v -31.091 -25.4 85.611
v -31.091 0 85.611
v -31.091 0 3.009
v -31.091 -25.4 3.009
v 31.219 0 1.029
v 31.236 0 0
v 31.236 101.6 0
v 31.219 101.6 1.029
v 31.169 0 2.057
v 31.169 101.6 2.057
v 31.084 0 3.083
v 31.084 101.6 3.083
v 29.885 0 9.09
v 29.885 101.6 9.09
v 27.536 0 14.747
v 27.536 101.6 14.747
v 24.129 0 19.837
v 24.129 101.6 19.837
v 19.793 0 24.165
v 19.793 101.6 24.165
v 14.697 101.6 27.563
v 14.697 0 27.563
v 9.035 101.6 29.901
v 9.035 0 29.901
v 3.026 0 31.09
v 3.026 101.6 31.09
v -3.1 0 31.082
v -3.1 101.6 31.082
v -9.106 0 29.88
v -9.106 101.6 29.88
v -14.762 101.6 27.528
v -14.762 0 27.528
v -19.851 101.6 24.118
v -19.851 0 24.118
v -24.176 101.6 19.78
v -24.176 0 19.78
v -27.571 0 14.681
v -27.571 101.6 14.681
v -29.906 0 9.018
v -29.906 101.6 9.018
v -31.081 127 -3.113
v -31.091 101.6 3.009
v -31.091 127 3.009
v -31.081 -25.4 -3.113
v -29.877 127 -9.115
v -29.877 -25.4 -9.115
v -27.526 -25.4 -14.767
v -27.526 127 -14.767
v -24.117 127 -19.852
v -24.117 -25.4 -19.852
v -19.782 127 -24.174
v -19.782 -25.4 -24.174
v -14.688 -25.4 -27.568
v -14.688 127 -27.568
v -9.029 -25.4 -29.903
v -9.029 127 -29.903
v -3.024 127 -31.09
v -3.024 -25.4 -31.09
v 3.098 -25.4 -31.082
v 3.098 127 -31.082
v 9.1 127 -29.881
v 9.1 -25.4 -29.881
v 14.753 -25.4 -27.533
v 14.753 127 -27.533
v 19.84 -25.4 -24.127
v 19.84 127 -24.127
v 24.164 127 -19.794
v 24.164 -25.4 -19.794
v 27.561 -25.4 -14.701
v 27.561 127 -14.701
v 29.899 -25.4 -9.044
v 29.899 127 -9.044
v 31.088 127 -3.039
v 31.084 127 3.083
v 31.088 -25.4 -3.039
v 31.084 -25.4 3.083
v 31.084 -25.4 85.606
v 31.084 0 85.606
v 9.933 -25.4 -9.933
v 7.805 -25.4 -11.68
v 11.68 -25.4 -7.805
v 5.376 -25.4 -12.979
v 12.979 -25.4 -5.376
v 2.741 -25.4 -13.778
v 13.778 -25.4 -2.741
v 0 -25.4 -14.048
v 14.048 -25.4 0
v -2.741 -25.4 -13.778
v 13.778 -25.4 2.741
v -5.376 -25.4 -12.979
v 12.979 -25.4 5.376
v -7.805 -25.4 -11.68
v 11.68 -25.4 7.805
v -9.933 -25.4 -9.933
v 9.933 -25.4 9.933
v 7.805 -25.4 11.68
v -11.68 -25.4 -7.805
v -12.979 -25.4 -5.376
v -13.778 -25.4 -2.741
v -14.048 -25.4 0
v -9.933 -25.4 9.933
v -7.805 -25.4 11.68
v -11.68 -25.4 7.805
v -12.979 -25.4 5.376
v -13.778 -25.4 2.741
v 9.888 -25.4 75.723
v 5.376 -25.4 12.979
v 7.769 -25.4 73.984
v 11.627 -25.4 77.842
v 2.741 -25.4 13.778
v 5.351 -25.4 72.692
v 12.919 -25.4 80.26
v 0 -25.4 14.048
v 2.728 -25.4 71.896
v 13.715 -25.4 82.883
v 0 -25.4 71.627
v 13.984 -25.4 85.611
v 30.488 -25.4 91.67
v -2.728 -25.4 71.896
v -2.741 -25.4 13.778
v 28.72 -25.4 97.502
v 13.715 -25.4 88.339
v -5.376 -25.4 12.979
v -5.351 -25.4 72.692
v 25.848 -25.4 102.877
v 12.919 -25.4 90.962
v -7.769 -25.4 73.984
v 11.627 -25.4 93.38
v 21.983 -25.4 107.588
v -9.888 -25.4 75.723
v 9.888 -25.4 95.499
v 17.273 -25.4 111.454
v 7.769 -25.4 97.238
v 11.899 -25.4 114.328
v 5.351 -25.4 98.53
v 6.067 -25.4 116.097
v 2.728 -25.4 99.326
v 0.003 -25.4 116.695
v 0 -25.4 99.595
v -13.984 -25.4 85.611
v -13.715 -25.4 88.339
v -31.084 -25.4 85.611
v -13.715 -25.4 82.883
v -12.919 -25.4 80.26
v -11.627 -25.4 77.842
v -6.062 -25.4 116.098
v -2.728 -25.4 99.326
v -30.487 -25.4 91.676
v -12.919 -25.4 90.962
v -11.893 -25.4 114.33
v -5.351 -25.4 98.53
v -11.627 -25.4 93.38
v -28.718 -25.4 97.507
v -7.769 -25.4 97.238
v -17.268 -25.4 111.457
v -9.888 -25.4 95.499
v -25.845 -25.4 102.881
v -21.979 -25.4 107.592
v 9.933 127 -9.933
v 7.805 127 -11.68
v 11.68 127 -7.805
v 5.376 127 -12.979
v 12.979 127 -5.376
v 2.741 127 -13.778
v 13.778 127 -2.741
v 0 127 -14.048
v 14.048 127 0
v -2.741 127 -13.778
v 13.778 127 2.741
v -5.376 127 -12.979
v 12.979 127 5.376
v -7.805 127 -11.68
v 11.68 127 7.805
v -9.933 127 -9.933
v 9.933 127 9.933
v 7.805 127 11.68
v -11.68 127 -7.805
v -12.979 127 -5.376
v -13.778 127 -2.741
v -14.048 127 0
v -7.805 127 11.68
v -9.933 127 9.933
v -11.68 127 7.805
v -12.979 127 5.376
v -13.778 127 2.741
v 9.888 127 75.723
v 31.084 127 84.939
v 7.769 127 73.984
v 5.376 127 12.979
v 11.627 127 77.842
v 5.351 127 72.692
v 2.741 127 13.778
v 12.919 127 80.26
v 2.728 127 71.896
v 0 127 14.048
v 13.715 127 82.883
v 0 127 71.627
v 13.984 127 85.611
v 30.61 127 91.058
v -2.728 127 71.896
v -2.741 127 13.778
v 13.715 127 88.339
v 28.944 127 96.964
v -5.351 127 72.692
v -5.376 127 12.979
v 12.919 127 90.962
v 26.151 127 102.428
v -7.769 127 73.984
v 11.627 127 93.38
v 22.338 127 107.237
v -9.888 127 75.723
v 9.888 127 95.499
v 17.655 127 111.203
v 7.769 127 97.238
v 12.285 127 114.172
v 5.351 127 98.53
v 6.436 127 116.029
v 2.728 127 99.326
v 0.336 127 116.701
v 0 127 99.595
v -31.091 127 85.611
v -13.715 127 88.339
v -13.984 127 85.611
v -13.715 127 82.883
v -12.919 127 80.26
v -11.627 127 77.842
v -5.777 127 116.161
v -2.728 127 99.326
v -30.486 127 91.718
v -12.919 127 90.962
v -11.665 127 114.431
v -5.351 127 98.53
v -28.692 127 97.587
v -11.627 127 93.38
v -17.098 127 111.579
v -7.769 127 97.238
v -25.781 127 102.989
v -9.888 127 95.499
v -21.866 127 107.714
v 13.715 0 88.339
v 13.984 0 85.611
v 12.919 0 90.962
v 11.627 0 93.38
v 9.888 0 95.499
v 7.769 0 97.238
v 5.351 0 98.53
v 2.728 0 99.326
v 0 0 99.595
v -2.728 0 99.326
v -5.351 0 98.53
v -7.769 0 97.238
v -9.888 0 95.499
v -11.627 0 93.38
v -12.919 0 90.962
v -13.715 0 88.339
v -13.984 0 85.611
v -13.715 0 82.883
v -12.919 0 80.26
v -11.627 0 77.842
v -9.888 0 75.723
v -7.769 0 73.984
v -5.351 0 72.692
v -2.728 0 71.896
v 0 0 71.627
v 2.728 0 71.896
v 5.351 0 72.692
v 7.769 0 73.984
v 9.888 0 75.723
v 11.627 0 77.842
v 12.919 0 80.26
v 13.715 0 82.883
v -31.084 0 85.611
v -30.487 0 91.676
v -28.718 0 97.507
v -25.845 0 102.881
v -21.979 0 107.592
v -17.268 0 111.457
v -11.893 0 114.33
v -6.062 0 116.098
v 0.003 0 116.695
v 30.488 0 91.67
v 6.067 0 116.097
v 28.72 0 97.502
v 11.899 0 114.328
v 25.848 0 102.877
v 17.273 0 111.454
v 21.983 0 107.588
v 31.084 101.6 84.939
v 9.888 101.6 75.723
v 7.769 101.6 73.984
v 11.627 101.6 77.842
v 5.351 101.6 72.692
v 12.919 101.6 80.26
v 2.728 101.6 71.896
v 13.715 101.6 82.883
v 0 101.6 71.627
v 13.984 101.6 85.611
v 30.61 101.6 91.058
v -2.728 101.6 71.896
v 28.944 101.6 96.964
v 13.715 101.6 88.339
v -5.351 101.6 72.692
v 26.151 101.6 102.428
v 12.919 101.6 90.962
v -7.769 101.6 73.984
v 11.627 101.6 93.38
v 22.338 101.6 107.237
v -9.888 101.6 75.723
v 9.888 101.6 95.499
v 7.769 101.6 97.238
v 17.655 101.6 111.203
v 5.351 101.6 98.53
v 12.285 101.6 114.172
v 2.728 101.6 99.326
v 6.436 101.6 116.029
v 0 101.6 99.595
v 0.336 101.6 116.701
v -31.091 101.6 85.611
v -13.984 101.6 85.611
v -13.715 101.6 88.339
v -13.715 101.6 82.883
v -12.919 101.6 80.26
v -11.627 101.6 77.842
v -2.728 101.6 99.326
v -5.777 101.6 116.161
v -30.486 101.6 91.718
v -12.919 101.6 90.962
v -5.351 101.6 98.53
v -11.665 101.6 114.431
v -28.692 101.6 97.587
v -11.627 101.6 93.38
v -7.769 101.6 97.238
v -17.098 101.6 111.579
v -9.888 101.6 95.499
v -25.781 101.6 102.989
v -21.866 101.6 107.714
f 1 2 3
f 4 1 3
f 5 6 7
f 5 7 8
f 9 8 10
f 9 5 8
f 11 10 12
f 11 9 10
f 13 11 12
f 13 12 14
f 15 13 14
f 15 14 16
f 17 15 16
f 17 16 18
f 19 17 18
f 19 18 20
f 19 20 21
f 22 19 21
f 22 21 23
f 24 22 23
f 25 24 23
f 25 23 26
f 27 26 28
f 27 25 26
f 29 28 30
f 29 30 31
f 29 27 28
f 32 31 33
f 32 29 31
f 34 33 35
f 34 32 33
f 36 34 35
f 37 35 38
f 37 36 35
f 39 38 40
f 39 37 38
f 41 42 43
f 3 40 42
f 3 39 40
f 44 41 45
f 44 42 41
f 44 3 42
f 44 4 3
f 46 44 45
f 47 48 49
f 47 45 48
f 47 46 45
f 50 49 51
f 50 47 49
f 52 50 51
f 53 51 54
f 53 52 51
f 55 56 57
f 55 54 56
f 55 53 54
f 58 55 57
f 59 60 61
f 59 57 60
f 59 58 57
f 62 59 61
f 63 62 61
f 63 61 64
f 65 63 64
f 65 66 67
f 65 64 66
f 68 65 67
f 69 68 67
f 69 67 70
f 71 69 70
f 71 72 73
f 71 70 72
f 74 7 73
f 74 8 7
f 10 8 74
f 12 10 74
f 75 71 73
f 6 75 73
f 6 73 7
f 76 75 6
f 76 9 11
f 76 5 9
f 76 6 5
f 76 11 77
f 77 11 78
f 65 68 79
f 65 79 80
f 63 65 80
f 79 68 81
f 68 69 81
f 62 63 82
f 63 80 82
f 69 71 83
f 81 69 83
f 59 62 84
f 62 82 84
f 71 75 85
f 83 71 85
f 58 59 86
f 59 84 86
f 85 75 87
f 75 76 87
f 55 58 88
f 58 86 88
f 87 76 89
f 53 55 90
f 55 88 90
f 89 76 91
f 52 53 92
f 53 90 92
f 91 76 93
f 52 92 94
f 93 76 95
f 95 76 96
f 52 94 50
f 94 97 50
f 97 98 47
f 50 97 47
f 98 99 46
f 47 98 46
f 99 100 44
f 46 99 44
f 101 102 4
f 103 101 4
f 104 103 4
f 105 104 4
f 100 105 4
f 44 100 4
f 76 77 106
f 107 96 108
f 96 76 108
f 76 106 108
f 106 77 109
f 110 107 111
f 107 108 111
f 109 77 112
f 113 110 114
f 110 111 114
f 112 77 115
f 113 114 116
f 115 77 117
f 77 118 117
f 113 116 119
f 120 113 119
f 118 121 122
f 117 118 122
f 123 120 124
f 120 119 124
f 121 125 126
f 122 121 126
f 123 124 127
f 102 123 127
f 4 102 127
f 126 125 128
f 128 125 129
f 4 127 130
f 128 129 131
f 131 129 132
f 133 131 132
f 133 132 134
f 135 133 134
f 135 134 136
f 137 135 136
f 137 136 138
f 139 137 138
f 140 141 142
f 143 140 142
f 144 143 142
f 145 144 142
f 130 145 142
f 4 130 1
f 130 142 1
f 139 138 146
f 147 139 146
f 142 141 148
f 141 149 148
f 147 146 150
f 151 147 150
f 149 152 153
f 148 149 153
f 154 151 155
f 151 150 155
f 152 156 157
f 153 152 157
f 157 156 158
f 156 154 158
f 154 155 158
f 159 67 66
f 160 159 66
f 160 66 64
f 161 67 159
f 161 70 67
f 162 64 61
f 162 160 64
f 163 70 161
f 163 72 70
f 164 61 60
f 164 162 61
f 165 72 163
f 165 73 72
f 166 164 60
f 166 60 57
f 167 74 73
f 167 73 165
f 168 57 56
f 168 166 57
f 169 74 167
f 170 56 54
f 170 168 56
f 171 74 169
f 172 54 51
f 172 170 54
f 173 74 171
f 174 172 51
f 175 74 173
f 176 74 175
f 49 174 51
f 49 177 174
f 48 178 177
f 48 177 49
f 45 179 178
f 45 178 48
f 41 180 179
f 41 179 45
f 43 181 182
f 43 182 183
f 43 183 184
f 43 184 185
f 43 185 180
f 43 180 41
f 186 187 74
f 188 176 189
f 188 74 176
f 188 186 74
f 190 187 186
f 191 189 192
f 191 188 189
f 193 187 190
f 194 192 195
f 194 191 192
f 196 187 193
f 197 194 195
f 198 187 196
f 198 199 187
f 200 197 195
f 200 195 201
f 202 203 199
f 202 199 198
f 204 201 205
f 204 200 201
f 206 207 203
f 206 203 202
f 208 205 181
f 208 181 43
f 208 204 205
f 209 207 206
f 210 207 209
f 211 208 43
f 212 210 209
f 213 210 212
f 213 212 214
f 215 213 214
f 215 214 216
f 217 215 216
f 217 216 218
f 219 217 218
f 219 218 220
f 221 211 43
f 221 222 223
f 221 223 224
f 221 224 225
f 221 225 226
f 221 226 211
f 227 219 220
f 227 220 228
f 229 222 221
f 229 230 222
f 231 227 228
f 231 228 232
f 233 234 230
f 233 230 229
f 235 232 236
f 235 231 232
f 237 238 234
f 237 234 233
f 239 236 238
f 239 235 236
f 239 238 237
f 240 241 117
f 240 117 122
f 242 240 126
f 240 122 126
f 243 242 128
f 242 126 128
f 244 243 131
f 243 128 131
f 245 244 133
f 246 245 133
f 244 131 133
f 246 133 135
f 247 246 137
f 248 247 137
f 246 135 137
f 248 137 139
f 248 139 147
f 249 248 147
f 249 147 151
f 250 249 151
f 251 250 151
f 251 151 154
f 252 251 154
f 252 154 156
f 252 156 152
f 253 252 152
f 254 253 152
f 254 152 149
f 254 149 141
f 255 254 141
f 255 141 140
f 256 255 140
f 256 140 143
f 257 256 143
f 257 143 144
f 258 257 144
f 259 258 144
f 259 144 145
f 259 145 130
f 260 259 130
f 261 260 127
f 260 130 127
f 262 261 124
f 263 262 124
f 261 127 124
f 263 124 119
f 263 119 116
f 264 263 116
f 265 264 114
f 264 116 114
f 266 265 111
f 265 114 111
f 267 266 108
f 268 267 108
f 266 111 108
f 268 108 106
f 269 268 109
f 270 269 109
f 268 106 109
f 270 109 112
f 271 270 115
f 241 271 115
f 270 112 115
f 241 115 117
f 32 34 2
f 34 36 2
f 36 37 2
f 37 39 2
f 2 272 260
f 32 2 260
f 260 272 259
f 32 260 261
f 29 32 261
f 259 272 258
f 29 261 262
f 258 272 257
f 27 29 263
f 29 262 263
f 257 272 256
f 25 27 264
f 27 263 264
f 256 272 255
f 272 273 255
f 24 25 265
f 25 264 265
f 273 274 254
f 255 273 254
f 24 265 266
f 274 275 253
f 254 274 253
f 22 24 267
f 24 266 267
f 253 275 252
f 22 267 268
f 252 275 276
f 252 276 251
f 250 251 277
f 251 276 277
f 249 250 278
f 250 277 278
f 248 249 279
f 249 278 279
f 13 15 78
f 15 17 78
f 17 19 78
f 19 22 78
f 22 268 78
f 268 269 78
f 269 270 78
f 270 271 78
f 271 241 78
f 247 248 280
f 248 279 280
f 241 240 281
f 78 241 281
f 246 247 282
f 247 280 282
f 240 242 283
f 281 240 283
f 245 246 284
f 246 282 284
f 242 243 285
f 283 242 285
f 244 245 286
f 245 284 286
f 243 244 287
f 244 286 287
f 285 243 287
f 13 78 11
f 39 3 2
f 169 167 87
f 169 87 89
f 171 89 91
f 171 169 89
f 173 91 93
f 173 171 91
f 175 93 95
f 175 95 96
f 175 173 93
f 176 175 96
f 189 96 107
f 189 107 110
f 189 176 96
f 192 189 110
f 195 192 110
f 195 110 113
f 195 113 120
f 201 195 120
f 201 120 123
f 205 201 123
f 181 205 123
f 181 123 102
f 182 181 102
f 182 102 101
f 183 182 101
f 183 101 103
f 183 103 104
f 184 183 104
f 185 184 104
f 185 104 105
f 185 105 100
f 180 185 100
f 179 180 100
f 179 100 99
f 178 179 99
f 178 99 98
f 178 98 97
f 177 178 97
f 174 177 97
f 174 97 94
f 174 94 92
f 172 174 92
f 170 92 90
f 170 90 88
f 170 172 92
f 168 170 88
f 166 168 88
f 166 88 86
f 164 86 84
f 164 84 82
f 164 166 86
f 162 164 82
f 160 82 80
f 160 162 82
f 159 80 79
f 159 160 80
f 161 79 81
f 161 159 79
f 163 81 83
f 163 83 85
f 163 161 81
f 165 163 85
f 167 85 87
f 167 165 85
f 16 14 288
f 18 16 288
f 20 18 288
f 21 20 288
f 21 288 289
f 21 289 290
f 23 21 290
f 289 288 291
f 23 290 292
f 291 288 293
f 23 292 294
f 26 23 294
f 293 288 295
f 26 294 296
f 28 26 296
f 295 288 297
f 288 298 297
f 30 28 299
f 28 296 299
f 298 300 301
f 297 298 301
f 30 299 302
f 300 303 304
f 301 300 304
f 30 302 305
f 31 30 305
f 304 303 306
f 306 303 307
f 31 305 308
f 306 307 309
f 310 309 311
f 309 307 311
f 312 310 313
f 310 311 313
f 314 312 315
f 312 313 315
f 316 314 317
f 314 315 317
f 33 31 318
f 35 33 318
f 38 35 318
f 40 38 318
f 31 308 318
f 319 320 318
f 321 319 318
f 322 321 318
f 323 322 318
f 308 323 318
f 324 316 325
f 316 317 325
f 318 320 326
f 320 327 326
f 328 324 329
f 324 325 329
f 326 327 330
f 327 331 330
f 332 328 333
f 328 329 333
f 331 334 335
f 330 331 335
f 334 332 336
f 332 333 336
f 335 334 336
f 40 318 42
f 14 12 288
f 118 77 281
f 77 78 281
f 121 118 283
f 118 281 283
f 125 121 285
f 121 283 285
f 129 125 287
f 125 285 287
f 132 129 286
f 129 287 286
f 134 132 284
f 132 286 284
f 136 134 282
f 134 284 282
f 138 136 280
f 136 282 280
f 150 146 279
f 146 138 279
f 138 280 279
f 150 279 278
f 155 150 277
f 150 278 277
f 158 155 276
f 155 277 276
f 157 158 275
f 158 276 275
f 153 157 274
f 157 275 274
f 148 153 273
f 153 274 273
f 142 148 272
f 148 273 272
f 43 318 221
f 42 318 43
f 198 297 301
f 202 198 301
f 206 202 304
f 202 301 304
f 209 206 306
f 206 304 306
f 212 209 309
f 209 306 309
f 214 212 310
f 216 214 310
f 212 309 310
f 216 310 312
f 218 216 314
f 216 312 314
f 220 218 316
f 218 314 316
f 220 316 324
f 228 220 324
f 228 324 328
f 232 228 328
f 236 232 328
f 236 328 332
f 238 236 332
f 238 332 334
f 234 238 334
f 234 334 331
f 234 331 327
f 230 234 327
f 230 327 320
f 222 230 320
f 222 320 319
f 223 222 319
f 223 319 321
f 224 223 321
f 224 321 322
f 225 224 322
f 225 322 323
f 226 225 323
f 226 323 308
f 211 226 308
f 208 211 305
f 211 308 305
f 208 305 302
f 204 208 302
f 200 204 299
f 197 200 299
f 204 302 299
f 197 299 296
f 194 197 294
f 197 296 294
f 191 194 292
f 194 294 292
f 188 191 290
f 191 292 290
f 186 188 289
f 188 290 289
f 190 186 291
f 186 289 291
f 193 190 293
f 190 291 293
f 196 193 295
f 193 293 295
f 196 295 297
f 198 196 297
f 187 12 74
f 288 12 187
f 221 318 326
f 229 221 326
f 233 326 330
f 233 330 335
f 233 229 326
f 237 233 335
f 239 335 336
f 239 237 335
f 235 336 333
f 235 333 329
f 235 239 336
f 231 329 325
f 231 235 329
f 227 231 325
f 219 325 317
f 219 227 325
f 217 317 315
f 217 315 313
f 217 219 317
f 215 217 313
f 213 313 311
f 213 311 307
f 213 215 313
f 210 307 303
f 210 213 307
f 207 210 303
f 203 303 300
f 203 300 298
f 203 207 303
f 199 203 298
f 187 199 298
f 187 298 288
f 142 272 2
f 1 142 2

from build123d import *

# Parameters (mm, degrees)
F0_R      = 31.236454
F2_DEPTH  = 25.4
F3_DEPTH  = 25.4
F4_DEPTH  = 50.8
F5_R      = 14.047882
F6_DEPTH  = 76.201
F8_W      = 31.083973
F8_H      = 25.4
F10_W     = 31.09123
F10_H     = 25.4
F12_R     = 13.98371
F13_DEPTH = 152.401


with BuildPart() as f2:
    # F0 (on Front) → F2 (new body)
    with BuildSketch(Plane.XZ):
        Circle(F0_R)
    extrude(amount=F2_DEPTH)

    # F1 (on face) → F3 (join)
    with BuildSketch(Plane.XZ):
        with BuildLine():
            Line((0, 85.611142), (0, 31.236454))
            ThreePointArc((0, 31.236454), (20.969327, 23.151746), (31.083973, 3.082637))
            Line((31.083973, 3.082637), (31.083973, 85.611142))
            Line((31.083973, 85.611142), (0, 85.611142))
        make_face()
        with BuildLine():
            Line((-31.09123, 85.611142), (-31.09123, 3.008564))
            ThreePointArc((-31.09123, 3.008564), (-20.996895, 23.126747), (0, 31.236454))
            Line((0, 31.236454), (0, 85.611142))
            Line((0, 85.611142), (-31.09123, 85.611142))
        make_face()
    extrude(amount=F3_DEPTH)

    # F0 (on Front) → F4 (join)
    with BuildSketch(Plane.XZ):
        Circle(F0_R)
    extrude(amount=-F4_DEPTH)

    # F5 (on face) → F6 (cut, through all)
    with BuildSketch(Plane.XZ.offset(25.4)):
        Circle(F5_R)
    extrude(amount=-F6_DEPTH, mode=Mode.SUBTRACT)

    # F7: F2 across face


with BuildPart() as f2_1:
    add(f2.part)
    add(f2.part.mirror(Plane(origin=(0, 50.8, 0), x_dir=(1, 0, 0), z_dir=(0, 1, 0))))

    # F8 (on face) → F9 (revolve)
    with BuildSketch(Plane.XY.offset(85.611142)):
        with Locations((15.541987, -12.7)):
            Rectangle(F8_W, F8_H)
    revolve(axis=Axis((0, -12.7, 85.611142), (0, -1, 0)))

    # F10 (on face) → F11 (revolve)
    with BuildSketch(Plane.XY.offset(85.611142)):
        with Locations((-15.545615, 114.3)):
            Rectangle(F10_W, F10_H)
    revolve(axis=Axis((0, 114.3, 85.611142), (0, 1, 0)))

    # F12 (on face) → F13 (cut, through all)
    with BuildSketch(Plane.XZ.offset(25.4)):
        with Locations((0, 85.611142)):
            Circle(F12_R)
    extrude(amount=-F13_DEPTH, mode=Mode.SUBTRACT)


solid = f2_1.part
